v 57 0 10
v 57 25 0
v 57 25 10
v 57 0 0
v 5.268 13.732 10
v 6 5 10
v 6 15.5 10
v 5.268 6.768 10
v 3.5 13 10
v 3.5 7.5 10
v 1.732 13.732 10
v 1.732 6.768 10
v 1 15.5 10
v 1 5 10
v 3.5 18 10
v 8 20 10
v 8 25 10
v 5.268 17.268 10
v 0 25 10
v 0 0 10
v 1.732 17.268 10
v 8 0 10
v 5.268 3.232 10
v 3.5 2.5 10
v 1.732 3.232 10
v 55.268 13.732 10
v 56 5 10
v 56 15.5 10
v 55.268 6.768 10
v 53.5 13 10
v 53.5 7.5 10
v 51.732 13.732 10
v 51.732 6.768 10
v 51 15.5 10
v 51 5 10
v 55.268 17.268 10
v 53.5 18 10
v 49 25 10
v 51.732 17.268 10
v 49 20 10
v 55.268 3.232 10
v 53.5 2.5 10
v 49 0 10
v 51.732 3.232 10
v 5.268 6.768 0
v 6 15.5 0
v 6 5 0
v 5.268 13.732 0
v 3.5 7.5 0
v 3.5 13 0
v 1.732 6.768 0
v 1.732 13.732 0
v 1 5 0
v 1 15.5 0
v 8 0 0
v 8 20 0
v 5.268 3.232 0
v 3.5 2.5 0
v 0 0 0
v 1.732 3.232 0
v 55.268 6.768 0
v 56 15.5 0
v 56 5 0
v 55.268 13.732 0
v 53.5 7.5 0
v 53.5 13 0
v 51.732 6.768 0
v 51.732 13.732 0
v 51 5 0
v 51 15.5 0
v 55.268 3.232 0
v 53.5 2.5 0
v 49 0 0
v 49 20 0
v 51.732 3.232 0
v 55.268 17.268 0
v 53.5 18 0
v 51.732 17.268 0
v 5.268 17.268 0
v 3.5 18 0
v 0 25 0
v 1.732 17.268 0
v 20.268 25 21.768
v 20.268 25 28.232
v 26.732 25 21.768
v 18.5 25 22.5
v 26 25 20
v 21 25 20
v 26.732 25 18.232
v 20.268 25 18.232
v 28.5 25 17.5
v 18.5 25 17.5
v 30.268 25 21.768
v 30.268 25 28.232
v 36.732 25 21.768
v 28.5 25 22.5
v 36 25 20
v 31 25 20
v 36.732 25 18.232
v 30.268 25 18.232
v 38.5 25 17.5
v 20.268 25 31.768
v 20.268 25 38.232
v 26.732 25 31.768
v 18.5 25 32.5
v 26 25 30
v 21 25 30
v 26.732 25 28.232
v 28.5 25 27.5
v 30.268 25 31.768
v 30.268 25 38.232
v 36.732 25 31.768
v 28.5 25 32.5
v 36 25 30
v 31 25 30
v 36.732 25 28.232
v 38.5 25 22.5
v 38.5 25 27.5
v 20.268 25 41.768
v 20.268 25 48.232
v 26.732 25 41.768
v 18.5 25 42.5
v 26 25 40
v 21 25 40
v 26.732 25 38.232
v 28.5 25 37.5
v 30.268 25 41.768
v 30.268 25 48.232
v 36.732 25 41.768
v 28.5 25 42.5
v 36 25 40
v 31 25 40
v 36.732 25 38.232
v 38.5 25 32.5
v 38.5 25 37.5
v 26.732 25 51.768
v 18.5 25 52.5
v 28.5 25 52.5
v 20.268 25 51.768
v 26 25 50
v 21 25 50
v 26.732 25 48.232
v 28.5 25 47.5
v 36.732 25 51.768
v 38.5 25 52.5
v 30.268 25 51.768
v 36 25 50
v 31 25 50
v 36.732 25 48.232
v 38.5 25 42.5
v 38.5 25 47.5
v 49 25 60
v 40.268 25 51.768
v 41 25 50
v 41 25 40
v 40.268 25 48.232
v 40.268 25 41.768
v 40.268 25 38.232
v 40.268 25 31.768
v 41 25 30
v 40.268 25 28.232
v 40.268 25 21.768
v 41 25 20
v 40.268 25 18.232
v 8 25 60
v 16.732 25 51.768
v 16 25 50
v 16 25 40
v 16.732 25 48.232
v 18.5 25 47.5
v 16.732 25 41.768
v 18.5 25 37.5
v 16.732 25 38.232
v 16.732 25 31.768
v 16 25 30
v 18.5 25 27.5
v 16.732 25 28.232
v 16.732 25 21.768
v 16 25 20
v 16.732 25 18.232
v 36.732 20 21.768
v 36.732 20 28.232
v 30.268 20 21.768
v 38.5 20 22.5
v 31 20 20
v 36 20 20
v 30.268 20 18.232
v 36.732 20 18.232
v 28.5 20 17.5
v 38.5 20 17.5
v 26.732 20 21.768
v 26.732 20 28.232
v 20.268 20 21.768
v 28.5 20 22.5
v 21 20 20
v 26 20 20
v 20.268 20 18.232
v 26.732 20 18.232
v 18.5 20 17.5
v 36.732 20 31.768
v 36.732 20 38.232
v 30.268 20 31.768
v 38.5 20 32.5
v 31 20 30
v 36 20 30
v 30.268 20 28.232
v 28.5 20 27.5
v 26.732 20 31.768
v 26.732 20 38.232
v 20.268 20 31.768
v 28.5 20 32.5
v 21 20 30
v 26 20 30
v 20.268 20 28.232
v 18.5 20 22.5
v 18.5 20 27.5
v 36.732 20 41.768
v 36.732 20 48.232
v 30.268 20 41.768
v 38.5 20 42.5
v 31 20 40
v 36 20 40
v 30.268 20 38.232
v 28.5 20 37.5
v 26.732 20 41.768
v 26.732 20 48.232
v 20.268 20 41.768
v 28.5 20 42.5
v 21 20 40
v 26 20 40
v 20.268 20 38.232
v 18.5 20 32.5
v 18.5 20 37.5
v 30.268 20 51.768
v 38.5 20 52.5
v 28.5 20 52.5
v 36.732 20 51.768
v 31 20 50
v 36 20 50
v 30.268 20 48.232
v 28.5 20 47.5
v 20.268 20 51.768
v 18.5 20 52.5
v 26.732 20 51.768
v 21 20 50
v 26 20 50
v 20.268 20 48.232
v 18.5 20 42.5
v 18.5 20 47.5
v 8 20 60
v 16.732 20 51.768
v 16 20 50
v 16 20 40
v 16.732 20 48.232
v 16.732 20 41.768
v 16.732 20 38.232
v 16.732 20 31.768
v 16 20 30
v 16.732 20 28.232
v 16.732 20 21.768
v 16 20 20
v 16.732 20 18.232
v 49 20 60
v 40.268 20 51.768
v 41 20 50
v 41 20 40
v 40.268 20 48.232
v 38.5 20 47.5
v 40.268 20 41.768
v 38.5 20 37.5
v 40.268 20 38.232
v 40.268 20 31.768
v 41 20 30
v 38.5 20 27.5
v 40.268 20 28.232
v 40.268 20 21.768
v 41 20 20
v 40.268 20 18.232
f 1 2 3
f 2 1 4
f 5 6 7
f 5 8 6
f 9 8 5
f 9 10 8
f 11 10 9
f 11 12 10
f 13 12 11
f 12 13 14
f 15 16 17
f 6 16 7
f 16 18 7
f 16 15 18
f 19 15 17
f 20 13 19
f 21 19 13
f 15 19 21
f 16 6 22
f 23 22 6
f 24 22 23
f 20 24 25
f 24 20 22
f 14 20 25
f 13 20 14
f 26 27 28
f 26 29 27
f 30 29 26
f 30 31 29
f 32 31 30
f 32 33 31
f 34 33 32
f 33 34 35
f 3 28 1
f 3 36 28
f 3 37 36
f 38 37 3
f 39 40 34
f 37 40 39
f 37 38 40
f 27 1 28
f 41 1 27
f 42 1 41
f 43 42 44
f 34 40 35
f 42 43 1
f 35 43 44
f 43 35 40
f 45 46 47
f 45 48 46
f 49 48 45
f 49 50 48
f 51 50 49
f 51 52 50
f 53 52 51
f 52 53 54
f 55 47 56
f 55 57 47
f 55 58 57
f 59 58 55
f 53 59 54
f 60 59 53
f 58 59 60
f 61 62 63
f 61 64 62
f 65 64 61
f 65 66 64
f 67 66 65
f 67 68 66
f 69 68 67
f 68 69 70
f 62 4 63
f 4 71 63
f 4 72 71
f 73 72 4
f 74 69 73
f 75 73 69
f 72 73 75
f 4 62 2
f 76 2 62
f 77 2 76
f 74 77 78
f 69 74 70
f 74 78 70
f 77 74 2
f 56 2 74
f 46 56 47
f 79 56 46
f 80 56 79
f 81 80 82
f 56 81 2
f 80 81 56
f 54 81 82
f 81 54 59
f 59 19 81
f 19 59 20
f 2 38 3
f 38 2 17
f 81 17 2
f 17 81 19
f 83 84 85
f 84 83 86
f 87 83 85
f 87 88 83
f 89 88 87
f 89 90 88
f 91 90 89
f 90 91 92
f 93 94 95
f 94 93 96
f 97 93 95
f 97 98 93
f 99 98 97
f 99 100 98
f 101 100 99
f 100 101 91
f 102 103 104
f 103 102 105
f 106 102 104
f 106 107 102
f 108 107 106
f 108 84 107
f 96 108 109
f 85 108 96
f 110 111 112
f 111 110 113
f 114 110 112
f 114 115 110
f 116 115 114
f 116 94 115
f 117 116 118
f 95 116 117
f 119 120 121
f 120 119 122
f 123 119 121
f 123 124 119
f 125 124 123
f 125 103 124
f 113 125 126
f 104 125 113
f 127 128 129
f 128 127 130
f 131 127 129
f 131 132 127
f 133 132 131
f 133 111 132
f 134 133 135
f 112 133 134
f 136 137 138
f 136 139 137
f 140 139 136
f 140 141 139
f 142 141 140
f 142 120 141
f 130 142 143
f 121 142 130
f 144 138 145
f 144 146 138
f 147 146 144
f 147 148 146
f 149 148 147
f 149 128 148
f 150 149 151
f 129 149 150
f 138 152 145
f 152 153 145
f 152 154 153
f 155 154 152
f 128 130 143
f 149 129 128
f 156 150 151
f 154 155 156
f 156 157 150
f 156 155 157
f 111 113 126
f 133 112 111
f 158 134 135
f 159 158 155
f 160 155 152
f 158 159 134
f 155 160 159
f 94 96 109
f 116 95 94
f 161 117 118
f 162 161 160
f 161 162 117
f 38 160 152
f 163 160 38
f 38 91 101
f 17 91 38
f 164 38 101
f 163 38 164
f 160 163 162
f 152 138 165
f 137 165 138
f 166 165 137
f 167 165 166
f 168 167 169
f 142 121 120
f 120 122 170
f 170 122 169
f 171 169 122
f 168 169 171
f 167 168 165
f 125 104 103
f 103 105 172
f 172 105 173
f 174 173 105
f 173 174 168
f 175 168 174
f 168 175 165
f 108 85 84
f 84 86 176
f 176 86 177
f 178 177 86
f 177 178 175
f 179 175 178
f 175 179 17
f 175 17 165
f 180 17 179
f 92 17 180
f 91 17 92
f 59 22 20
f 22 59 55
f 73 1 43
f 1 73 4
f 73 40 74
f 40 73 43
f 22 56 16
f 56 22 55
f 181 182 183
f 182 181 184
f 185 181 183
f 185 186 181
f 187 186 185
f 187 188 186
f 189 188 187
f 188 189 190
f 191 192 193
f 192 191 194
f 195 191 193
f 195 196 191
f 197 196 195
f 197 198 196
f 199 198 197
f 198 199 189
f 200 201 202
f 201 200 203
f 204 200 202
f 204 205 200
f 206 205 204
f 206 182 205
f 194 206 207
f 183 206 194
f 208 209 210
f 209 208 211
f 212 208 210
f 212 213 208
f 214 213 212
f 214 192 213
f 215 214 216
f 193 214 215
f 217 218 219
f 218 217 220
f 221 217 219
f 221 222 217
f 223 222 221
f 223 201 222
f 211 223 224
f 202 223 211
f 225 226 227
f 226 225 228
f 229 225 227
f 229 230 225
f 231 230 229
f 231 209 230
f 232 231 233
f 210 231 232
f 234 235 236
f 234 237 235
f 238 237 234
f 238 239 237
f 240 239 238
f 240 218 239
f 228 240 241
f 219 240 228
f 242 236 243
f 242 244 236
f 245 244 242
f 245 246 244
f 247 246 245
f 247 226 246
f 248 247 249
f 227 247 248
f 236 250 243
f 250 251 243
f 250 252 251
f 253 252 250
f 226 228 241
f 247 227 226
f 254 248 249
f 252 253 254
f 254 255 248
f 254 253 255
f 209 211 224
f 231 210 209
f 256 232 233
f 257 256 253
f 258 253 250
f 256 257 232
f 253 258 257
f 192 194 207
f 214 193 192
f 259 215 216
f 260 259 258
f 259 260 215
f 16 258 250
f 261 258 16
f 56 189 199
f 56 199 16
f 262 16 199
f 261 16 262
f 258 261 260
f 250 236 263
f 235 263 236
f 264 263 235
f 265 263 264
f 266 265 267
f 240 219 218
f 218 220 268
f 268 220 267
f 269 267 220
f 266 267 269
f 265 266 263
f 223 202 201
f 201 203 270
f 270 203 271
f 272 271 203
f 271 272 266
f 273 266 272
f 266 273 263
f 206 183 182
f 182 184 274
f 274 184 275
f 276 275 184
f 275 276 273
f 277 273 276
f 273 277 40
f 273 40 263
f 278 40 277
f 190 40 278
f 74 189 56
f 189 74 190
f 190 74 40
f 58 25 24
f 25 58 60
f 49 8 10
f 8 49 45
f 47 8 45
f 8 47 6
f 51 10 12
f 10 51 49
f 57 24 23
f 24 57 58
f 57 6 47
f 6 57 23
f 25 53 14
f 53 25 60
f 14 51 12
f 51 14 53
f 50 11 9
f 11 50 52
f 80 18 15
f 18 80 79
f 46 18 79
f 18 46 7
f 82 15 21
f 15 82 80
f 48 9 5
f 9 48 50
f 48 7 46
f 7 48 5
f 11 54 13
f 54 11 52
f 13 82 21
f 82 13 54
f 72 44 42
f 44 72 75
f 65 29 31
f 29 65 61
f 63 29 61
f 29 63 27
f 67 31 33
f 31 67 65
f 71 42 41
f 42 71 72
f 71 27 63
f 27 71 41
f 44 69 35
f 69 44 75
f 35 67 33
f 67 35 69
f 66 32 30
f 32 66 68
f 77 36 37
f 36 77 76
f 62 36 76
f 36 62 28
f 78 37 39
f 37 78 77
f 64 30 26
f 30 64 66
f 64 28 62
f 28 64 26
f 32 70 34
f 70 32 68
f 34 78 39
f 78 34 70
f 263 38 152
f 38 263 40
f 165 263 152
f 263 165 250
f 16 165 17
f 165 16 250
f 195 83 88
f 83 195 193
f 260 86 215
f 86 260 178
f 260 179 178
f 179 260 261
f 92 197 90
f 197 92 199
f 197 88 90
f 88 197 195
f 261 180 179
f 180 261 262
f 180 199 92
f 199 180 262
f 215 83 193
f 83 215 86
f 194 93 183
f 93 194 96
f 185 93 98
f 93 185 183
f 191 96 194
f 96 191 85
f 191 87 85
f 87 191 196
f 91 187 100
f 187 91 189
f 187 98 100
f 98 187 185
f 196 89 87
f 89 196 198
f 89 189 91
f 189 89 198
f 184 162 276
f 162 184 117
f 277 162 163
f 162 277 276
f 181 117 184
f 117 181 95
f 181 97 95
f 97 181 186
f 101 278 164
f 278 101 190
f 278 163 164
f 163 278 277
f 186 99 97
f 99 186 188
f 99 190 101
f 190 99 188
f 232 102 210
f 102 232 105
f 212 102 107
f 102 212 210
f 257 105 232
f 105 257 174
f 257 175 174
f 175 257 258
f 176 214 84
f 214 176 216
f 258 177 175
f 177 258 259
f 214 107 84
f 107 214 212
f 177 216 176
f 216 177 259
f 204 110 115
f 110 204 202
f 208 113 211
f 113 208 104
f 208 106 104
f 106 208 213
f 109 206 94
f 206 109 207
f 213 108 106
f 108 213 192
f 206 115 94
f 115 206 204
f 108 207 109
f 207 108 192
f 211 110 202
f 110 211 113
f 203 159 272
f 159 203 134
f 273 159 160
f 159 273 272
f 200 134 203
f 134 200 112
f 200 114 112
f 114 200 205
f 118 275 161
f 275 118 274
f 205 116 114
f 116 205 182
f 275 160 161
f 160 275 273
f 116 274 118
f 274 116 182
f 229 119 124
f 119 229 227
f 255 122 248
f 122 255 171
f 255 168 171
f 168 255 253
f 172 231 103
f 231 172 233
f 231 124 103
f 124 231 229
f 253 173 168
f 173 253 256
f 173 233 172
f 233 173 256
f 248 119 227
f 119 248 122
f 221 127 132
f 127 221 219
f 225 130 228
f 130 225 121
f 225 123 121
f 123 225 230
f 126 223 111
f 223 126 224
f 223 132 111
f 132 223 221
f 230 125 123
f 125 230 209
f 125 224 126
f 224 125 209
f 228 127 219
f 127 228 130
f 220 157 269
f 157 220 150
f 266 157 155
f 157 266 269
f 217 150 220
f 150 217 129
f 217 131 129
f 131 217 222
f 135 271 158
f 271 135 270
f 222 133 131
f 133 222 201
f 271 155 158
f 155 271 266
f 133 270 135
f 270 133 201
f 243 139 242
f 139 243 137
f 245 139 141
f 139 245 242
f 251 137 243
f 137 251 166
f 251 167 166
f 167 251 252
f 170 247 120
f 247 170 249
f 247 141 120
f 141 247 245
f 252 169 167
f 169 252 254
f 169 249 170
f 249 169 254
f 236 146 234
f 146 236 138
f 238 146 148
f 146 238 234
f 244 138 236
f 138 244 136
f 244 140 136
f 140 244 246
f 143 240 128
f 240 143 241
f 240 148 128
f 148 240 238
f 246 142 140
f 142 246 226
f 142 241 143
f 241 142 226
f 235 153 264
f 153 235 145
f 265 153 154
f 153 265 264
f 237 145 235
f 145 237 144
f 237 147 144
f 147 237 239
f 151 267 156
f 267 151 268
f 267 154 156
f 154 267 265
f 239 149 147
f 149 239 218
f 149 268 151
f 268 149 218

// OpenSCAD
difference(){
    cube([57, 25, 10], center = 0);
    translate([8, 0, 0])
    cube([41, 20, 10], center = 0);
    
    translate([3.5, 5, 0])
    cylinder(11, r=2.5, center=0);

    translate([3.5, 15.5, 0])
    cylinder(11, r=2.5, center=0);

    translate([53.5, 5, 0])
    cylinder(11, r=2.5, center=0);

    translate([53.5, 15.5, 0])
    cylinder(11, r=2.5, center=0);
}

difference(){
    translate([8, 20, 0])
    cube([41, 5, 60], center = 0);
    
    translate([18.5, 30, 20])
    rotate([90, 0, 0])
    cylinder(11, r=2.5, center=0);
    
    translate([28.5, 30, 20])
    rotate([90, 0, 0])
    cylinder(11, r=2.5, center=0);
    
    translate([38.5, 30, 20])
    rotate([90, 0, 0])
    cylinder(11, r=2.5, center=0);
    
    translate([18.5, 30, 30])
    rotate([90, 0, 0])
    cylinder(11, r=2.5, center=0);
    
    translate([28.5, 30, 30])
    rotate([90, 0, 0])
    cylinder(11, r=2.5, center=0);
    
    translate([38.5, 30, 30])
    rotate([90, 0, 0])
    cylinder(11, r=2.5, center=0);
    
    translate([18.5, 30, 40])
    rotate([90, 0, 0])
    cylinder(11, r=2.5, center=0);
    
    translate([28.5, 30, 40])
    rotate([90, 0, 0])
    cylinder(11, r=2.5, center=0);
    
    translate([38.5, 30, 40])
    rotate([90, 0, 0])
    cylinder(11, r=2.5, center=0);
    
    translate([18.5, 30, 50])
    rotate([90, 0, 0])
    cylinder(11, r=2.5, center=0);
    
    translate([28.5, 30, 50])
    rotate([90, 0, 0])
    cylinder(11, r=2.5, center=0);
    
    translate([38.5, 30, 50])
    rotate([90, 0, 0])
    cylinder(11, r=2.5, center=0);
}
